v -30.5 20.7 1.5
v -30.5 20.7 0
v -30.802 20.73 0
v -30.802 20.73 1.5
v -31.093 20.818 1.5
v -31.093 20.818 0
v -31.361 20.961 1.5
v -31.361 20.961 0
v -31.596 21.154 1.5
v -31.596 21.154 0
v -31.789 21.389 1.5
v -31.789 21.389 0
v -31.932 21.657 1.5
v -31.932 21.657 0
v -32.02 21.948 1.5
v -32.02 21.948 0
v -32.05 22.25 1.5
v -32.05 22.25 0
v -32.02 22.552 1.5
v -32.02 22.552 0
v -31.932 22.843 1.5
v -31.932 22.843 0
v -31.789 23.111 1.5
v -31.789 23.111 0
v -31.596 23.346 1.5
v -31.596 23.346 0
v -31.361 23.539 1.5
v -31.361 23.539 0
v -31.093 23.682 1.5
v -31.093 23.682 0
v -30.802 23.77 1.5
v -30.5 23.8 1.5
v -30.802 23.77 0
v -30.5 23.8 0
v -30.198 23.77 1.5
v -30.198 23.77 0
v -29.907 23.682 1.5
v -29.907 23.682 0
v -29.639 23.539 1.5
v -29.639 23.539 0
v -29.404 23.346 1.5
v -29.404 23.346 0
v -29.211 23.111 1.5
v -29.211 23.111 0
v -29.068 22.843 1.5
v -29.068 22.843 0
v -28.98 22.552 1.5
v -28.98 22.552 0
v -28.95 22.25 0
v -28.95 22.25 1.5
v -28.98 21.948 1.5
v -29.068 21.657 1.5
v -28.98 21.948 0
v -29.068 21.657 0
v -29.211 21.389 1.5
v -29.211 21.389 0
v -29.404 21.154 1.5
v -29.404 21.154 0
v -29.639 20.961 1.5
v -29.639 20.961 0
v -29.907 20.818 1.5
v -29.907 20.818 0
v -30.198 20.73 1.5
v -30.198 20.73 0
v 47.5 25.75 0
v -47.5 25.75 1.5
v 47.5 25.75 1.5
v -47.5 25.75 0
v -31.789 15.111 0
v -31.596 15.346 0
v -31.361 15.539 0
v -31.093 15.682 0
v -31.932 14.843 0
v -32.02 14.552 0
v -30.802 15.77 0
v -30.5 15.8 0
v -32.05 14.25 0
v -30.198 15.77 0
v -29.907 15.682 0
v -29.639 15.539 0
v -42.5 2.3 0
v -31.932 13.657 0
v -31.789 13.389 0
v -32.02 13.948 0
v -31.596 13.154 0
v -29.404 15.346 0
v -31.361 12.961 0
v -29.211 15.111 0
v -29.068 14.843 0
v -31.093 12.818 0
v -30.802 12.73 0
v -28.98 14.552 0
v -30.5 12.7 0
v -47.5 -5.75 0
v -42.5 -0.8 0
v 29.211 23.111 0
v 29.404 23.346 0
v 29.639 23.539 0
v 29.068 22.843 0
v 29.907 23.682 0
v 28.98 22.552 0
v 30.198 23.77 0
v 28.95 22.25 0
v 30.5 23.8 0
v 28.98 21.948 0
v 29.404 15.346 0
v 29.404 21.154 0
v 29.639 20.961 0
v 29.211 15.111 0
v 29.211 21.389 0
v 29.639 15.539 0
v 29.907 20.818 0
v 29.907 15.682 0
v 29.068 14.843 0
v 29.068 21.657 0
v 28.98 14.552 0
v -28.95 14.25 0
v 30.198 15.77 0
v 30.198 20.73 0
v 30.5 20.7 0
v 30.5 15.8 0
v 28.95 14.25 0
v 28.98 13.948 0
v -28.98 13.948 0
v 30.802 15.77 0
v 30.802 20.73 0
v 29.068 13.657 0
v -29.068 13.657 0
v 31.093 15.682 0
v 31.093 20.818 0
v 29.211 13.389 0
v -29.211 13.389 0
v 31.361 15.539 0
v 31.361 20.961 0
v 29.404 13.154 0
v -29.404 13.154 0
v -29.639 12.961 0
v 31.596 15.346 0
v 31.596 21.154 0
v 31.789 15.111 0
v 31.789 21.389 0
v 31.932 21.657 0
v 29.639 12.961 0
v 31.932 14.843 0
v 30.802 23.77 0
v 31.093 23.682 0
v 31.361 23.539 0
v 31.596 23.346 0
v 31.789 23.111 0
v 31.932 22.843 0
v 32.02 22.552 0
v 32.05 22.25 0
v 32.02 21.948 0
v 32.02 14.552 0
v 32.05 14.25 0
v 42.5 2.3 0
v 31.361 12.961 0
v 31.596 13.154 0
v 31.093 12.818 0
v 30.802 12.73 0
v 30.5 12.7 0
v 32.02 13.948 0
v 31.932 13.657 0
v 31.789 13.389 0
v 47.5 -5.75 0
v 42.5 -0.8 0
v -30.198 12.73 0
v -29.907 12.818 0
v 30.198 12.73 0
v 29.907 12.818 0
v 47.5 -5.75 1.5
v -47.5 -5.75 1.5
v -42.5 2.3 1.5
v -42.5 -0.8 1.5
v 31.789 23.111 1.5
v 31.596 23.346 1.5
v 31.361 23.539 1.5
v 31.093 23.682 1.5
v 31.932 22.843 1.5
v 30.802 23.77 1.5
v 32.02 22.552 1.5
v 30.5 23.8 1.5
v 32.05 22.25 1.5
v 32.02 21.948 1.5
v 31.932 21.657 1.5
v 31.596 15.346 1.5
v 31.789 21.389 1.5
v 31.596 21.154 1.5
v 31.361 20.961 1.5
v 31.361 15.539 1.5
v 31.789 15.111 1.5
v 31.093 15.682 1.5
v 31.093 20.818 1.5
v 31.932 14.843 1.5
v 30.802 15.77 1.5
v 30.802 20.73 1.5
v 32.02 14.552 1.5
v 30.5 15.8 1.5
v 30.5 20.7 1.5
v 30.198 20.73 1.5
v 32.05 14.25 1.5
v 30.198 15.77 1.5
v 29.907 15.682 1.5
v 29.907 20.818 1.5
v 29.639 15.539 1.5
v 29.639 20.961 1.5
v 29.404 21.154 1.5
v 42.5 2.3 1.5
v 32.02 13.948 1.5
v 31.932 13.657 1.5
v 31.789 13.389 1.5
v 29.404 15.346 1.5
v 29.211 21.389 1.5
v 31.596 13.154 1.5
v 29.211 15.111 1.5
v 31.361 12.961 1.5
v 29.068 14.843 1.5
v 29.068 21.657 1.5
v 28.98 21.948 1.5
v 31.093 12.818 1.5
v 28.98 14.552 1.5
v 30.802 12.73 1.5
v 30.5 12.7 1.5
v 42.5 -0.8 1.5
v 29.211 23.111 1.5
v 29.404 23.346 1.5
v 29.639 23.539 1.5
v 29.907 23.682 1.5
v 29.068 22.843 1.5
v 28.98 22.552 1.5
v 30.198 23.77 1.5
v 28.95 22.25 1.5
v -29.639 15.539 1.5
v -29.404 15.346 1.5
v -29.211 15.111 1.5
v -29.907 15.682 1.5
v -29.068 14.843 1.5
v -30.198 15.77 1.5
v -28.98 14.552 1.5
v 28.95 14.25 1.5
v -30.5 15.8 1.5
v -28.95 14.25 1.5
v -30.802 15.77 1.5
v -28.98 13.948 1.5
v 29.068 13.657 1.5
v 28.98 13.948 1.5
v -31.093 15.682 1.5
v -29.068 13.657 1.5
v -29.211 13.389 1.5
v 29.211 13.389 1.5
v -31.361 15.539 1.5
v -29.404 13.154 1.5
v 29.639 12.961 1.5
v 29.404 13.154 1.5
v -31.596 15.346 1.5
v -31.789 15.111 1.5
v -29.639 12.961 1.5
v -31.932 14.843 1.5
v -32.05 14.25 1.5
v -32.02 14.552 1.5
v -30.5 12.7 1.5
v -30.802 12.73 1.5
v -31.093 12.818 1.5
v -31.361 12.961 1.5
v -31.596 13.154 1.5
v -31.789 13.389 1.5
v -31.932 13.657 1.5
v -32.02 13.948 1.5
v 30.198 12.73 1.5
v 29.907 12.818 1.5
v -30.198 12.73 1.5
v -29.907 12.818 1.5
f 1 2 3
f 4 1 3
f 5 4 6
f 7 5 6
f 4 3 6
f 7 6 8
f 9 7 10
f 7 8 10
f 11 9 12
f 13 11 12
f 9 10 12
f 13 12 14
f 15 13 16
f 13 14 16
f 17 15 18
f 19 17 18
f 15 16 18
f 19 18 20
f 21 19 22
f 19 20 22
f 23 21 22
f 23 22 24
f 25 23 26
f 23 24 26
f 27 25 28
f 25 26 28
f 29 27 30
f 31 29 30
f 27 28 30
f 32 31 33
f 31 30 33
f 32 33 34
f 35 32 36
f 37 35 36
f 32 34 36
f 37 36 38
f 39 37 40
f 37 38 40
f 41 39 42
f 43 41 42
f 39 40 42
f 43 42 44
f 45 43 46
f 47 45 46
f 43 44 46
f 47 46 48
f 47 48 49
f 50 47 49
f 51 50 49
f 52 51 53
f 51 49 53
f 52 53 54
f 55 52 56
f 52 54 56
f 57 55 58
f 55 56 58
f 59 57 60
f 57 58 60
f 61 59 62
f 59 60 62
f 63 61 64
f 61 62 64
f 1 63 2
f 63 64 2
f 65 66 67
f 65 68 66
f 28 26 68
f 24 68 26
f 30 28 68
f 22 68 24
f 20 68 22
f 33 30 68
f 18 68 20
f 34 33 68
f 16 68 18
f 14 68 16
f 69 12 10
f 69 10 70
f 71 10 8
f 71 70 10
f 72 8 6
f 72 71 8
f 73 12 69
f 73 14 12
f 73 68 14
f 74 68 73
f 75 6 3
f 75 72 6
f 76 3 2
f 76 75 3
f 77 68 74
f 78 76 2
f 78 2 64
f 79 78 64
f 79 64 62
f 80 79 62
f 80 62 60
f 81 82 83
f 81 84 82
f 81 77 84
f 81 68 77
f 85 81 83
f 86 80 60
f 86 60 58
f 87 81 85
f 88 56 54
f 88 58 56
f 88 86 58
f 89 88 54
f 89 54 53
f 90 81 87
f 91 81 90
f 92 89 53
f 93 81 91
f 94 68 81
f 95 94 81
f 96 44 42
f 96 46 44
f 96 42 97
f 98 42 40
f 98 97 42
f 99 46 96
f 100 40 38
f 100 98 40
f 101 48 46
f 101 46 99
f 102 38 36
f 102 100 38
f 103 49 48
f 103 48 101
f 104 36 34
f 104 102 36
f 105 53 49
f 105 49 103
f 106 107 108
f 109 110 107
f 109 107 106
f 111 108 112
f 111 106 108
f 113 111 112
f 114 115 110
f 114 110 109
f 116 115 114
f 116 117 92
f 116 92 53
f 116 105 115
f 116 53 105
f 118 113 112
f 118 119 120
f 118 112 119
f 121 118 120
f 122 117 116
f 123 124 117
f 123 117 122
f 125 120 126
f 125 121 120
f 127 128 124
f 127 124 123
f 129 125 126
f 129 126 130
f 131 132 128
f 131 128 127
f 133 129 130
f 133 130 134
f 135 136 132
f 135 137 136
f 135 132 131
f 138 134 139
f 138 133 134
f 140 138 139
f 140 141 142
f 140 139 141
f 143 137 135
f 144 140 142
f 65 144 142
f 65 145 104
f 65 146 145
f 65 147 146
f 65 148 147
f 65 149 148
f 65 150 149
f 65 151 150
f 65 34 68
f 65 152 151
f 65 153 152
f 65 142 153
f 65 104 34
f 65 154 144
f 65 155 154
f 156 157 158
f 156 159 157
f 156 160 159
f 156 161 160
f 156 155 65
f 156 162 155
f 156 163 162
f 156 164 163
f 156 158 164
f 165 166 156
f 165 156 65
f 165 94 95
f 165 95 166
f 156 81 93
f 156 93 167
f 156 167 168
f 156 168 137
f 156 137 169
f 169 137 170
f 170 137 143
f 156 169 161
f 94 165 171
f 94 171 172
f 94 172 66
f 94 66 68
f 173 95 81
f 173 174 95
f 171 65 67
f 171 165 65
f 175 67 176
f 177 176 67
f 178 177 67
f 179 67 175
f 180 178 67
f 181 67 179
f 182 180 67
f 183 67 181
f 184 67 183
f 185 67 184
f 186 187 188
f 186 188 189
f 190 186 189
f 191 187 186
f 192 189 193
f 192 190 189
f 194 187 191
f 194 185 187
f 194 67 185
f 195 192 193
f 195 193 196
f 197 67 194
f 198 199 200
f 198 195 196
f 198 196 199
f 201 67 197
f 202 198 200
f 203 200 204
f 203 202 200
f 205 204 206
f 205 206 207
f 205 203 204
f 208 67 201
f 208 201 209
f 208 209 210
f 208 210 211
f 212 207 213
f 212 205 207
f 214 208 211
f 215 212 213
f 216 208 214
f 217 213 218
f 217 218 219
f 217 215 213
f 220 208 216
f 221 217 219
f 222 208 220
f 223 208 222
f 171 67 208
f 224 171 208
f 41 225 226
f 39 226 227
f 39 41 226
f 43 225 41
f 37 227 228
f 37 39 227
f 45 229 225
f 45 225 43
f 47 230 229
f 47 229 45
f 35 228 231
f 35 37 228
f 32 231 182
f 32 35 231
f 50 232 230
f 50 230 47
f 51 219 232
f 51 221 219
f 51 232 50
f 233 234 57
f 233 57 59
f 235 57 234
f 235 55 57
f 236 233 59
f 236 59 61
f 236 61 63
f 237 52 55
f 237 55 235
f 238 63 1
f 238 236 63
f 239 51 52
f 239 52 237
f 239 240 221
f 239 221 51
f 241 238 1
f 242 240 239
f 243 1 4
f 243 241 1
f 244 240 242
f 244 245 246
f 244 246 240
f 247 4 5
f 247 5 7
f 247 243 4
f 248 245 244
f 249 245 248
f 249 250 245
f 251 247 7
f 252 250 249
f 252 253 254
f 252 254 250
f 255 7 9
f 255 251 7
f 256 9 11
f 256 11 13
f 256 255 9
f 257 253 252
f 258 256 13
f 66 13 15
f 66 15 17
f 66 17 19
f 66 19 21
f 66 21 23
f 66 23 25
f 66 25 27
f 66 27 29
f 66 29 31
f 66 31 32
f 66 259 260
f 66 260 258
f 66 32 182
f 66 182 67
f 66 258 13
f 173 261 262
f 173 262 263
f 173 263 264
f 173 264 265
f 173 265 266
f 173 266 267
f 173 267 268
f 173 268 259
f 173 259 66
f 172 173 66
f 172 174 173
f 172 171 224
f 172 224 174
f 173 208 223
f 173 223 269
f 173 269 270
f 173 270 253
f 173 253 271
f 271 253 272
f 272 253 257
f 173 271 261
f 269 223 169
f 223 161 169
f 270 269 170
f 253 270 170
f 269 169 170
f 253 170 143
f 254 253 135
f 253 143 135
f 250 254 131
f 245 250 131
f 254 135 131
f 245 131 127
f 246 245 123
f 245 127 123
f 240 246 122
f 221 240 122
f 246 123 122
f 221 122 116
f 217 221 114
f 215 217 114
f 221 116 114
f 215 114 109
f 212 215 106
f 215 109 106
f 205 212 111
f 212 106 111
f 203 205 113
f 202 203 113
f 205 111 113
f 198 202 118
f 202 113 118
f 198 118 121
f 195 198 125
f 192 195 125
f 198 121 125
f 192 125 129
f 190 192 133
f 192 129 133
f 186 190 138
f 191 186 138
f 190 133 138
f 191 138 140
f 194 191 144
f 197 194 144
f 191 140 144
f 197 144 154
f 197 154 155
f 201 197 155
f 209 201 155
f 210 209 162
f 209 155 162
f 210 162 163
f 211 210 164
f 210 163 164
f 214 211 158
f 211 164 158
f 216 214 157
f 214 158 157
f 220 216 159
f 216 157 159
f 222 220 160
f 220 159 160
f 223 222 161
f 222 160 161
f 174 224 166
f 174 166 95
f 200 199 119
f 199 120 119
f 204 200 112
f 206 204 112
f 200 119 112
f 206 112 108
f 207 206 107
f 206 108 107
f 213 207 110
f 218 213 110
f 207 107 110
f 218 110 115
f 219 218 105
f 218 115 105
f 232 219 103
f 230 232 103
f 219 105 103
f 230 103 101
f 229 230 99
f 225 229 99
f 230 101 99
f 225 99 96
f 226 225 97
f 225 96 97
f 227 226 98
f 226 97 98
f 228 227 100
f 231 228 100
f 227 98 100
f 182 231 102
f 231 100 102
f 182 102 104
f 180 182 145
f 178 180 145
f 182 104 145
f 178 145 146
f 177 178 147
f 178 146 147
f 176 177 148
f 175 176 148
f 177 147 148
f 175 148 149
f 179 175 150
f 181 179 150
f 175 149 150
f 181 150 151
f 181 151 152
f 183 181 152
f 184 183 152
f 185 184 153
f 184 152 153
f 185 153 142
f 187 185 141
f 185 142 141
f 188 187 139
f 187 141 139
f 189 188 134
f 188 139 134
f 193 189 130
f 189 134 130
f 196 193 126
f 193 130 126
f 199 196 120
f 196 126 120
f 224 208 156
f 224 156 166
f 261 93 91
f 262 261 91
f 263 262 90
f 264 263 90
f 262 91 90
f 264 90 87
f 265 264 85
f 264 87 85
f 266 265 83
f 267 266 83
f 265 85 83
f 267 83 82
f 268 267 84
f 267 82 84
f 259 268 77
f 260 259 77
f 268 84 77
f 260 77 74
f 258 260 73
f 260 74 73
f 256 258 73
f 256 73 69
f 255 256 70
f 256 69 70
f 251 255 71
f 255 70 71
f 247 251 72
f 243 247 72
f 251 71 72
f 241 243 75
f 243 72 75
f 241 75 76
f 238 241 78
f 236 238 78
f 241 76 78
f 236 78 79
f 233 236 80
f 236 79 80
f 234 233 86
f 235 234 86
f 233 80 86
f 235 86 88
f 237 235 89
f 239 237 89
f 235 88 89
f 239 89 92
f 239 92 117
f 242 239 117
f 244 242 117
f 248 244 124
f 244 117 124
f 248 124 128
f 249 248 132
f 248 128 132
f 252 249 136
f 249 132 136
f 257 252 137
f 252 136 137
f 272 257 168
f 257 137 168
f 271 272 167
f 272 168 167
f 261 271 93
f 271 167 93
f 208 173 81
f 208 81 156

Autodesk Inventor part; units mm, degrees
ref_plane "YZ Plane" through (0, 0, 0) normal (1, 0, 0) x (0, 1, 0)
ref_plane "XZ Plane" through (0, 0, 0) normal (0, 1, 0) x (-1, 0, 0)
ref_plane "XY Plane" through (0, 0, 0) normal (0, 0, 1) x (1, 0, 0)
sketch "スケッチ1" plane through (0, 0, 0) normal (0, 0, 1) x (1, 0, 0)
  line L0 (-47.5, 5.75) -> (47.5, 5.75)
  line L1 (47.5, 5.75) -> (47.5, -5.75)
  line L2 (47.5, -5.75) -> (-47.5, -5.75)
  line L3 (-47.5, -5.75) -> (-47.5, 5.75)
  line L4 (-47.5, 5.75) -> (47.5, -5.75) construction
  line L5 (47.5, 5.75) -> (-47.5, -5.75) construction
  point P0 (0, 0)
  dimension "d0" = 11.5
  dimension "d1" = 95
extrude "押し出し1" add sketch "スケッチ1" along normal blind 1.5
sketch "スケッチ2" plane through (0, 0, 1.5) normal (0, 0, 1) x (1, 0, 0)
  line L0 (-42.5, 2.3) -> (42.5, 2.3)
  line L1 (42.5, 2.3) -> (42.5, -0.8)
  line L2 (42.5, -0.8) -> (-42.5, -0.8)
  line L3 (-42.5, -0.8) -> (-42.5, 2.3)
  line L4 (-47.5, -5.75) -> (47.5, -5.75) projected
  line L5 (47.5, -5.75) -> (47.5, 5.75) projected
  point P0 (0, 0)
  dimension "d8" = 3.1
  dimension "d9" = 85
  dimension "d10" = 4.95
  dimension "d11" = 5
extrude "押し出し2" cut sketch "スケッチ2" against normal blind 1.5
sketch "スケッチ5" plane through (-47.5, 5.75, 0) normal (0, 1, 0) x (1, 0, 0)
  line L0 (0, 0) -> (95, 0)
  line L1 (95, 0) -> (95, -1.5)
  line L2 (95, -1.5) -> (0, -1.5)
  line L3 (0, -1.5) -> (0, 0)
  point P0 (47.5, 0)
extrude "押し出し4" add sketch "スケッチ5" along normal blind 20
sketch "スケッチ6" plane through (0, 0, 1.5) normal (0, 0, 1) x (1, 0, 0)
  line L0 (-47.5, 25.75) -> (47.5, 25.75) projected
  line L1 (-47.5, -5.75) -> (-47.5, 25.75) projected
  point P0 (0, 0)
  point P1 (30.5, 22.25)
  point P2 (-30.5, 22.25)
  point P3 (-30.5, 14.25)
  point P4 (30.5, 14.25)
  dimension "d32" = 3.5
  dimension "d33" = 8
  dimension "d34" = 61
  dimension "d35" = 17
hole "穴2" at (30.5, 22.25, 1.5) at (-30.5, 22.25, 1.5) at (-30.5, 14.25, 1.5) at (30.5, 14.25, 1.5) direction (0, 0, -1) diameter 3.1 end through all
equation "\"d41\" = Thickness"
equation "\"BendRadius\" = Thickness"
equation "\"BendReliefWidth\" = Thickness"
equation "\"BendReliefDepth\" = 0.5 * Thickness"
equation "\"CornerReliefSize\" = 4 * Thickness"
equation "\"MinimumRemnant\" = 2 * Thickness"
equation "\"TransitionRadius\" = BendRadius"
equation "\"JacobiRadiusSize\" = BendRadius"
equation "\"GapSize\" = Thickness"
equation "\"Thickness\" = 0.5"
properties part number "Fork 2 ver2c" material "アルミニウム 5052 H32"
